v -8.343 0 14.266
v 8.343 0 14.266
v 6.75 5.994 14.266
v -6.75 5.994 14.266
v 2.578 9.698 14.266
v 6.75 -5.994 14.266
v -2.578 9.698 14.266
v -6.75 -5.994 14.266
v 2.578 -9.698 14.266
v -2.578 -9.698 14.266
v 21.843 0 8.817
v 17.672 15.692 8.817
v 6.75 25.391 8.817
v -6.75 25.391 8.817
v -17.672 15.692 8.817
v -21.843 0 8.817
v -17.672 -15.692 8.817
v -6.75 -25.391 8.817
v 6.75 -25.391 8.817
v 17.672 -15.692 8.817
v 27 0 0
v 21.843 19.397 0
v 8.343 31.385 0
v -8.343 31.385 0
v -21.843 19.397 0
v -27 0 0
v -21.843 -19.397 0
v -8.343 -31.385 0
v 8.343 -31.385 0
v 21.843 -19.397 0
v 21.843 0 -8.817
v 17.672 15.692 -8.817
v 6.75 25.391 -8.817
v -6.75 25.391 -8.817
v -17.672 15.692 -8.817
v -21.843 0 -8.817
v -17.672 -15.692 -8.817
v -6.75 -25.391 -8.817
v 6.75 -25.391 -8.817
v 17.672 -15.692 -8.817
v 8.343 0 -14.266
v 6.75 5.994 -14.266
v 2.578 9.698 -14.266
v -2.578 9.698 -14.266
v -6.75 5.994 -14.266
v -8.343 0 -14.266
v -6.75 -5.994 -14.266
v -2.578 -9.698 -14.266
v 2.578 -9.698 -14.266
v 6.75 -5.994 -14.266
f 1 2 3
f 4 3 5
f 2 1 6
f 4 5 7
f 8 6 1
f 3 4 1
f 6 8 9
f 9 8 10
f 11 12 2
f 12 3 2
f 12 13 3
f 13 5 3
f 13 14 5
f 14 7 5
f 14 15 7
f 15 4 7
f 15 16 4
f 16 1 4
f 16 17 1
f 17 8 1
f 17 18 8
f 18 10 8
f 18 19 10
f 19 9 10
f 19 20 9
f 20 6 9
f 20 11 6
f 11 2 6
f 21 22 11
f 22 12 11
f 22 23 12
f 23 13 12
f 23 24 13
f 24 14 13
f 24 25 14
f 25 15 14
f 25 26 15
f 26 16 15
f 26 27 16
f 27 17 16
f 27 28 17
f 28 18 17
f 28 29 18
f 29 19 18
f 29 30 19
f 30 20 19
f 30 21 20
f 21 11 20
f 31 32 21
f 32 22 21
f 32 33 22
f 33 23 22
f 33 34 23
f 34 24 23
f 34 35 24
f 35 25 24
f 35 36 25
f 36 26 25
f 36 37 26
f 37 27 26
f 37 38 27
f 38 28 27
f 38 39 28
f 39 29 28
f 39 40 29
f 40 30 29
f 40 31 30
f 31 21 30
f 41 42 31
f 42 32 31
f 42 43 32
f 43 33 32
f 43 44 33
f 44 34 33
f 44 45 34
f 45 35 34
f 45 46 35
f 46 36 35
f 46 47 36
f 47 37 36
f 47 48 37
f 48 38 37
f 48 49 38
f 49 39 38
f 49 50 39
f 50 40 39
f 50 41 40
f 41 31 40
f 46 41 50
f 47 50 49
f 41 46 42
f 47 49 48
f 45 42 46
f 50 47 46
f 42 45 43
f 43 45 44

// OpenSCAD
// Generated by SolidPython 1.0.1 on 2020-07-29 00:46:48


scale(v = [9, 11, 5]) {
	sphere(r = 3);
}
/***********************************************
*********      SolidPython code:      **********
************************************************
 
# import packages: SolidPython
from solid import *
from solid.utils import *
from itertools import chain, combinations, permutations


class Resize:

    def __init__(self, scad_file):
        self.scad_file = scad_file
        #self.scad_file = import_scad(scad_file)
        # cone/cylinder param:
        self.r1 = 0
        self.r2 = 0
        self.h = 0
        # rectangular prism param:
        self.w = 0
        self.l = 0
        # ellipse param:
        self.r = 0

    # import OpenScad code (file name corresponds to shape)


    # classify shape + parameters
    def assign(self, param1, param2, param3):
        if self.scad_file == 'cone.scad':
            self.r1 = param1
            self.r2 = param2
            self.h = param3
        elif self.scad_file == 'cylinder.scad':
            self.r1 = param1
            self.r2 = param2
            self.h = param3
        elif self.scad_file == 'rectangularPrism.scad':
            self.h = param1
            self.l = param2
            self.w = param3
        else:
            self.r = param1
            self.h = param2

    # resize parameters
    def iterate(self):
        x = range(3, 20, 2)
        i = 1
        if self.scad_file == 'cone.scad':
            tempList = list(permutations(x, 2))
            for temp in tempList:
                param1 = temp[0]
                param2 = temp[1]
                filepath = 'produced_scad_files/' + 'cone' + str(param1) + '_' + str(param2) + '_' + '.scad'
                scad_render_to_file(cylinder(h=param1, r1=param2, r2=0), filepath)

        elif self.scad_file == 'cylinder.scad':
            tempList = list(permutations(x, 3))
            for temp in tempList:
                param1 = temp[0]
                param2 = temp[1]
                filepath = 'produced_scad_files/' + 'cylinder' + str(param1) + '_' + str(param2) + '_' + '.scad'
                scad_render_to_file(cylinder(h=param1, r1=param2, r2=param2), filepath)

        elif self.scad_file == 'rectangularPrism.scad':
            tempList = list(permutations(x, 3))
            for temp in tempList:
                param1 = temp[0]
                param2 = temp[1]
                param3 = temp[2]
                filepath = 'produced_scad_files/' + 'rectangularPrism' + str(param1) + '_' + str(param2) + '_' + str(
                    param3) + '.scad'
                scad_render_to_file(cube(size=(param1, param2, param3)), filepath)

        elif self.scad_file == 'ellipse.scad':
            tempList = list(permutations(x, 4))
            for temp in tempList:
                param1 = temp[0]
                param2 = temp[1]
                param3 = temp[2]
                param4 = temp[3]
                filepath = 'produced_scad_files/' + 'ellipse' + str(param1) + '_' + str(param2) + '_' + str(param3) + '_' + str(param4) + '.scad'
                scad_render_to_file(scale([param1, param2, param3])(sphere(r=param4)), filepath)

    def render_to_scadfile(self):
        scad_render_to_file(scad, 'example.scad') 
 
************************************************/
